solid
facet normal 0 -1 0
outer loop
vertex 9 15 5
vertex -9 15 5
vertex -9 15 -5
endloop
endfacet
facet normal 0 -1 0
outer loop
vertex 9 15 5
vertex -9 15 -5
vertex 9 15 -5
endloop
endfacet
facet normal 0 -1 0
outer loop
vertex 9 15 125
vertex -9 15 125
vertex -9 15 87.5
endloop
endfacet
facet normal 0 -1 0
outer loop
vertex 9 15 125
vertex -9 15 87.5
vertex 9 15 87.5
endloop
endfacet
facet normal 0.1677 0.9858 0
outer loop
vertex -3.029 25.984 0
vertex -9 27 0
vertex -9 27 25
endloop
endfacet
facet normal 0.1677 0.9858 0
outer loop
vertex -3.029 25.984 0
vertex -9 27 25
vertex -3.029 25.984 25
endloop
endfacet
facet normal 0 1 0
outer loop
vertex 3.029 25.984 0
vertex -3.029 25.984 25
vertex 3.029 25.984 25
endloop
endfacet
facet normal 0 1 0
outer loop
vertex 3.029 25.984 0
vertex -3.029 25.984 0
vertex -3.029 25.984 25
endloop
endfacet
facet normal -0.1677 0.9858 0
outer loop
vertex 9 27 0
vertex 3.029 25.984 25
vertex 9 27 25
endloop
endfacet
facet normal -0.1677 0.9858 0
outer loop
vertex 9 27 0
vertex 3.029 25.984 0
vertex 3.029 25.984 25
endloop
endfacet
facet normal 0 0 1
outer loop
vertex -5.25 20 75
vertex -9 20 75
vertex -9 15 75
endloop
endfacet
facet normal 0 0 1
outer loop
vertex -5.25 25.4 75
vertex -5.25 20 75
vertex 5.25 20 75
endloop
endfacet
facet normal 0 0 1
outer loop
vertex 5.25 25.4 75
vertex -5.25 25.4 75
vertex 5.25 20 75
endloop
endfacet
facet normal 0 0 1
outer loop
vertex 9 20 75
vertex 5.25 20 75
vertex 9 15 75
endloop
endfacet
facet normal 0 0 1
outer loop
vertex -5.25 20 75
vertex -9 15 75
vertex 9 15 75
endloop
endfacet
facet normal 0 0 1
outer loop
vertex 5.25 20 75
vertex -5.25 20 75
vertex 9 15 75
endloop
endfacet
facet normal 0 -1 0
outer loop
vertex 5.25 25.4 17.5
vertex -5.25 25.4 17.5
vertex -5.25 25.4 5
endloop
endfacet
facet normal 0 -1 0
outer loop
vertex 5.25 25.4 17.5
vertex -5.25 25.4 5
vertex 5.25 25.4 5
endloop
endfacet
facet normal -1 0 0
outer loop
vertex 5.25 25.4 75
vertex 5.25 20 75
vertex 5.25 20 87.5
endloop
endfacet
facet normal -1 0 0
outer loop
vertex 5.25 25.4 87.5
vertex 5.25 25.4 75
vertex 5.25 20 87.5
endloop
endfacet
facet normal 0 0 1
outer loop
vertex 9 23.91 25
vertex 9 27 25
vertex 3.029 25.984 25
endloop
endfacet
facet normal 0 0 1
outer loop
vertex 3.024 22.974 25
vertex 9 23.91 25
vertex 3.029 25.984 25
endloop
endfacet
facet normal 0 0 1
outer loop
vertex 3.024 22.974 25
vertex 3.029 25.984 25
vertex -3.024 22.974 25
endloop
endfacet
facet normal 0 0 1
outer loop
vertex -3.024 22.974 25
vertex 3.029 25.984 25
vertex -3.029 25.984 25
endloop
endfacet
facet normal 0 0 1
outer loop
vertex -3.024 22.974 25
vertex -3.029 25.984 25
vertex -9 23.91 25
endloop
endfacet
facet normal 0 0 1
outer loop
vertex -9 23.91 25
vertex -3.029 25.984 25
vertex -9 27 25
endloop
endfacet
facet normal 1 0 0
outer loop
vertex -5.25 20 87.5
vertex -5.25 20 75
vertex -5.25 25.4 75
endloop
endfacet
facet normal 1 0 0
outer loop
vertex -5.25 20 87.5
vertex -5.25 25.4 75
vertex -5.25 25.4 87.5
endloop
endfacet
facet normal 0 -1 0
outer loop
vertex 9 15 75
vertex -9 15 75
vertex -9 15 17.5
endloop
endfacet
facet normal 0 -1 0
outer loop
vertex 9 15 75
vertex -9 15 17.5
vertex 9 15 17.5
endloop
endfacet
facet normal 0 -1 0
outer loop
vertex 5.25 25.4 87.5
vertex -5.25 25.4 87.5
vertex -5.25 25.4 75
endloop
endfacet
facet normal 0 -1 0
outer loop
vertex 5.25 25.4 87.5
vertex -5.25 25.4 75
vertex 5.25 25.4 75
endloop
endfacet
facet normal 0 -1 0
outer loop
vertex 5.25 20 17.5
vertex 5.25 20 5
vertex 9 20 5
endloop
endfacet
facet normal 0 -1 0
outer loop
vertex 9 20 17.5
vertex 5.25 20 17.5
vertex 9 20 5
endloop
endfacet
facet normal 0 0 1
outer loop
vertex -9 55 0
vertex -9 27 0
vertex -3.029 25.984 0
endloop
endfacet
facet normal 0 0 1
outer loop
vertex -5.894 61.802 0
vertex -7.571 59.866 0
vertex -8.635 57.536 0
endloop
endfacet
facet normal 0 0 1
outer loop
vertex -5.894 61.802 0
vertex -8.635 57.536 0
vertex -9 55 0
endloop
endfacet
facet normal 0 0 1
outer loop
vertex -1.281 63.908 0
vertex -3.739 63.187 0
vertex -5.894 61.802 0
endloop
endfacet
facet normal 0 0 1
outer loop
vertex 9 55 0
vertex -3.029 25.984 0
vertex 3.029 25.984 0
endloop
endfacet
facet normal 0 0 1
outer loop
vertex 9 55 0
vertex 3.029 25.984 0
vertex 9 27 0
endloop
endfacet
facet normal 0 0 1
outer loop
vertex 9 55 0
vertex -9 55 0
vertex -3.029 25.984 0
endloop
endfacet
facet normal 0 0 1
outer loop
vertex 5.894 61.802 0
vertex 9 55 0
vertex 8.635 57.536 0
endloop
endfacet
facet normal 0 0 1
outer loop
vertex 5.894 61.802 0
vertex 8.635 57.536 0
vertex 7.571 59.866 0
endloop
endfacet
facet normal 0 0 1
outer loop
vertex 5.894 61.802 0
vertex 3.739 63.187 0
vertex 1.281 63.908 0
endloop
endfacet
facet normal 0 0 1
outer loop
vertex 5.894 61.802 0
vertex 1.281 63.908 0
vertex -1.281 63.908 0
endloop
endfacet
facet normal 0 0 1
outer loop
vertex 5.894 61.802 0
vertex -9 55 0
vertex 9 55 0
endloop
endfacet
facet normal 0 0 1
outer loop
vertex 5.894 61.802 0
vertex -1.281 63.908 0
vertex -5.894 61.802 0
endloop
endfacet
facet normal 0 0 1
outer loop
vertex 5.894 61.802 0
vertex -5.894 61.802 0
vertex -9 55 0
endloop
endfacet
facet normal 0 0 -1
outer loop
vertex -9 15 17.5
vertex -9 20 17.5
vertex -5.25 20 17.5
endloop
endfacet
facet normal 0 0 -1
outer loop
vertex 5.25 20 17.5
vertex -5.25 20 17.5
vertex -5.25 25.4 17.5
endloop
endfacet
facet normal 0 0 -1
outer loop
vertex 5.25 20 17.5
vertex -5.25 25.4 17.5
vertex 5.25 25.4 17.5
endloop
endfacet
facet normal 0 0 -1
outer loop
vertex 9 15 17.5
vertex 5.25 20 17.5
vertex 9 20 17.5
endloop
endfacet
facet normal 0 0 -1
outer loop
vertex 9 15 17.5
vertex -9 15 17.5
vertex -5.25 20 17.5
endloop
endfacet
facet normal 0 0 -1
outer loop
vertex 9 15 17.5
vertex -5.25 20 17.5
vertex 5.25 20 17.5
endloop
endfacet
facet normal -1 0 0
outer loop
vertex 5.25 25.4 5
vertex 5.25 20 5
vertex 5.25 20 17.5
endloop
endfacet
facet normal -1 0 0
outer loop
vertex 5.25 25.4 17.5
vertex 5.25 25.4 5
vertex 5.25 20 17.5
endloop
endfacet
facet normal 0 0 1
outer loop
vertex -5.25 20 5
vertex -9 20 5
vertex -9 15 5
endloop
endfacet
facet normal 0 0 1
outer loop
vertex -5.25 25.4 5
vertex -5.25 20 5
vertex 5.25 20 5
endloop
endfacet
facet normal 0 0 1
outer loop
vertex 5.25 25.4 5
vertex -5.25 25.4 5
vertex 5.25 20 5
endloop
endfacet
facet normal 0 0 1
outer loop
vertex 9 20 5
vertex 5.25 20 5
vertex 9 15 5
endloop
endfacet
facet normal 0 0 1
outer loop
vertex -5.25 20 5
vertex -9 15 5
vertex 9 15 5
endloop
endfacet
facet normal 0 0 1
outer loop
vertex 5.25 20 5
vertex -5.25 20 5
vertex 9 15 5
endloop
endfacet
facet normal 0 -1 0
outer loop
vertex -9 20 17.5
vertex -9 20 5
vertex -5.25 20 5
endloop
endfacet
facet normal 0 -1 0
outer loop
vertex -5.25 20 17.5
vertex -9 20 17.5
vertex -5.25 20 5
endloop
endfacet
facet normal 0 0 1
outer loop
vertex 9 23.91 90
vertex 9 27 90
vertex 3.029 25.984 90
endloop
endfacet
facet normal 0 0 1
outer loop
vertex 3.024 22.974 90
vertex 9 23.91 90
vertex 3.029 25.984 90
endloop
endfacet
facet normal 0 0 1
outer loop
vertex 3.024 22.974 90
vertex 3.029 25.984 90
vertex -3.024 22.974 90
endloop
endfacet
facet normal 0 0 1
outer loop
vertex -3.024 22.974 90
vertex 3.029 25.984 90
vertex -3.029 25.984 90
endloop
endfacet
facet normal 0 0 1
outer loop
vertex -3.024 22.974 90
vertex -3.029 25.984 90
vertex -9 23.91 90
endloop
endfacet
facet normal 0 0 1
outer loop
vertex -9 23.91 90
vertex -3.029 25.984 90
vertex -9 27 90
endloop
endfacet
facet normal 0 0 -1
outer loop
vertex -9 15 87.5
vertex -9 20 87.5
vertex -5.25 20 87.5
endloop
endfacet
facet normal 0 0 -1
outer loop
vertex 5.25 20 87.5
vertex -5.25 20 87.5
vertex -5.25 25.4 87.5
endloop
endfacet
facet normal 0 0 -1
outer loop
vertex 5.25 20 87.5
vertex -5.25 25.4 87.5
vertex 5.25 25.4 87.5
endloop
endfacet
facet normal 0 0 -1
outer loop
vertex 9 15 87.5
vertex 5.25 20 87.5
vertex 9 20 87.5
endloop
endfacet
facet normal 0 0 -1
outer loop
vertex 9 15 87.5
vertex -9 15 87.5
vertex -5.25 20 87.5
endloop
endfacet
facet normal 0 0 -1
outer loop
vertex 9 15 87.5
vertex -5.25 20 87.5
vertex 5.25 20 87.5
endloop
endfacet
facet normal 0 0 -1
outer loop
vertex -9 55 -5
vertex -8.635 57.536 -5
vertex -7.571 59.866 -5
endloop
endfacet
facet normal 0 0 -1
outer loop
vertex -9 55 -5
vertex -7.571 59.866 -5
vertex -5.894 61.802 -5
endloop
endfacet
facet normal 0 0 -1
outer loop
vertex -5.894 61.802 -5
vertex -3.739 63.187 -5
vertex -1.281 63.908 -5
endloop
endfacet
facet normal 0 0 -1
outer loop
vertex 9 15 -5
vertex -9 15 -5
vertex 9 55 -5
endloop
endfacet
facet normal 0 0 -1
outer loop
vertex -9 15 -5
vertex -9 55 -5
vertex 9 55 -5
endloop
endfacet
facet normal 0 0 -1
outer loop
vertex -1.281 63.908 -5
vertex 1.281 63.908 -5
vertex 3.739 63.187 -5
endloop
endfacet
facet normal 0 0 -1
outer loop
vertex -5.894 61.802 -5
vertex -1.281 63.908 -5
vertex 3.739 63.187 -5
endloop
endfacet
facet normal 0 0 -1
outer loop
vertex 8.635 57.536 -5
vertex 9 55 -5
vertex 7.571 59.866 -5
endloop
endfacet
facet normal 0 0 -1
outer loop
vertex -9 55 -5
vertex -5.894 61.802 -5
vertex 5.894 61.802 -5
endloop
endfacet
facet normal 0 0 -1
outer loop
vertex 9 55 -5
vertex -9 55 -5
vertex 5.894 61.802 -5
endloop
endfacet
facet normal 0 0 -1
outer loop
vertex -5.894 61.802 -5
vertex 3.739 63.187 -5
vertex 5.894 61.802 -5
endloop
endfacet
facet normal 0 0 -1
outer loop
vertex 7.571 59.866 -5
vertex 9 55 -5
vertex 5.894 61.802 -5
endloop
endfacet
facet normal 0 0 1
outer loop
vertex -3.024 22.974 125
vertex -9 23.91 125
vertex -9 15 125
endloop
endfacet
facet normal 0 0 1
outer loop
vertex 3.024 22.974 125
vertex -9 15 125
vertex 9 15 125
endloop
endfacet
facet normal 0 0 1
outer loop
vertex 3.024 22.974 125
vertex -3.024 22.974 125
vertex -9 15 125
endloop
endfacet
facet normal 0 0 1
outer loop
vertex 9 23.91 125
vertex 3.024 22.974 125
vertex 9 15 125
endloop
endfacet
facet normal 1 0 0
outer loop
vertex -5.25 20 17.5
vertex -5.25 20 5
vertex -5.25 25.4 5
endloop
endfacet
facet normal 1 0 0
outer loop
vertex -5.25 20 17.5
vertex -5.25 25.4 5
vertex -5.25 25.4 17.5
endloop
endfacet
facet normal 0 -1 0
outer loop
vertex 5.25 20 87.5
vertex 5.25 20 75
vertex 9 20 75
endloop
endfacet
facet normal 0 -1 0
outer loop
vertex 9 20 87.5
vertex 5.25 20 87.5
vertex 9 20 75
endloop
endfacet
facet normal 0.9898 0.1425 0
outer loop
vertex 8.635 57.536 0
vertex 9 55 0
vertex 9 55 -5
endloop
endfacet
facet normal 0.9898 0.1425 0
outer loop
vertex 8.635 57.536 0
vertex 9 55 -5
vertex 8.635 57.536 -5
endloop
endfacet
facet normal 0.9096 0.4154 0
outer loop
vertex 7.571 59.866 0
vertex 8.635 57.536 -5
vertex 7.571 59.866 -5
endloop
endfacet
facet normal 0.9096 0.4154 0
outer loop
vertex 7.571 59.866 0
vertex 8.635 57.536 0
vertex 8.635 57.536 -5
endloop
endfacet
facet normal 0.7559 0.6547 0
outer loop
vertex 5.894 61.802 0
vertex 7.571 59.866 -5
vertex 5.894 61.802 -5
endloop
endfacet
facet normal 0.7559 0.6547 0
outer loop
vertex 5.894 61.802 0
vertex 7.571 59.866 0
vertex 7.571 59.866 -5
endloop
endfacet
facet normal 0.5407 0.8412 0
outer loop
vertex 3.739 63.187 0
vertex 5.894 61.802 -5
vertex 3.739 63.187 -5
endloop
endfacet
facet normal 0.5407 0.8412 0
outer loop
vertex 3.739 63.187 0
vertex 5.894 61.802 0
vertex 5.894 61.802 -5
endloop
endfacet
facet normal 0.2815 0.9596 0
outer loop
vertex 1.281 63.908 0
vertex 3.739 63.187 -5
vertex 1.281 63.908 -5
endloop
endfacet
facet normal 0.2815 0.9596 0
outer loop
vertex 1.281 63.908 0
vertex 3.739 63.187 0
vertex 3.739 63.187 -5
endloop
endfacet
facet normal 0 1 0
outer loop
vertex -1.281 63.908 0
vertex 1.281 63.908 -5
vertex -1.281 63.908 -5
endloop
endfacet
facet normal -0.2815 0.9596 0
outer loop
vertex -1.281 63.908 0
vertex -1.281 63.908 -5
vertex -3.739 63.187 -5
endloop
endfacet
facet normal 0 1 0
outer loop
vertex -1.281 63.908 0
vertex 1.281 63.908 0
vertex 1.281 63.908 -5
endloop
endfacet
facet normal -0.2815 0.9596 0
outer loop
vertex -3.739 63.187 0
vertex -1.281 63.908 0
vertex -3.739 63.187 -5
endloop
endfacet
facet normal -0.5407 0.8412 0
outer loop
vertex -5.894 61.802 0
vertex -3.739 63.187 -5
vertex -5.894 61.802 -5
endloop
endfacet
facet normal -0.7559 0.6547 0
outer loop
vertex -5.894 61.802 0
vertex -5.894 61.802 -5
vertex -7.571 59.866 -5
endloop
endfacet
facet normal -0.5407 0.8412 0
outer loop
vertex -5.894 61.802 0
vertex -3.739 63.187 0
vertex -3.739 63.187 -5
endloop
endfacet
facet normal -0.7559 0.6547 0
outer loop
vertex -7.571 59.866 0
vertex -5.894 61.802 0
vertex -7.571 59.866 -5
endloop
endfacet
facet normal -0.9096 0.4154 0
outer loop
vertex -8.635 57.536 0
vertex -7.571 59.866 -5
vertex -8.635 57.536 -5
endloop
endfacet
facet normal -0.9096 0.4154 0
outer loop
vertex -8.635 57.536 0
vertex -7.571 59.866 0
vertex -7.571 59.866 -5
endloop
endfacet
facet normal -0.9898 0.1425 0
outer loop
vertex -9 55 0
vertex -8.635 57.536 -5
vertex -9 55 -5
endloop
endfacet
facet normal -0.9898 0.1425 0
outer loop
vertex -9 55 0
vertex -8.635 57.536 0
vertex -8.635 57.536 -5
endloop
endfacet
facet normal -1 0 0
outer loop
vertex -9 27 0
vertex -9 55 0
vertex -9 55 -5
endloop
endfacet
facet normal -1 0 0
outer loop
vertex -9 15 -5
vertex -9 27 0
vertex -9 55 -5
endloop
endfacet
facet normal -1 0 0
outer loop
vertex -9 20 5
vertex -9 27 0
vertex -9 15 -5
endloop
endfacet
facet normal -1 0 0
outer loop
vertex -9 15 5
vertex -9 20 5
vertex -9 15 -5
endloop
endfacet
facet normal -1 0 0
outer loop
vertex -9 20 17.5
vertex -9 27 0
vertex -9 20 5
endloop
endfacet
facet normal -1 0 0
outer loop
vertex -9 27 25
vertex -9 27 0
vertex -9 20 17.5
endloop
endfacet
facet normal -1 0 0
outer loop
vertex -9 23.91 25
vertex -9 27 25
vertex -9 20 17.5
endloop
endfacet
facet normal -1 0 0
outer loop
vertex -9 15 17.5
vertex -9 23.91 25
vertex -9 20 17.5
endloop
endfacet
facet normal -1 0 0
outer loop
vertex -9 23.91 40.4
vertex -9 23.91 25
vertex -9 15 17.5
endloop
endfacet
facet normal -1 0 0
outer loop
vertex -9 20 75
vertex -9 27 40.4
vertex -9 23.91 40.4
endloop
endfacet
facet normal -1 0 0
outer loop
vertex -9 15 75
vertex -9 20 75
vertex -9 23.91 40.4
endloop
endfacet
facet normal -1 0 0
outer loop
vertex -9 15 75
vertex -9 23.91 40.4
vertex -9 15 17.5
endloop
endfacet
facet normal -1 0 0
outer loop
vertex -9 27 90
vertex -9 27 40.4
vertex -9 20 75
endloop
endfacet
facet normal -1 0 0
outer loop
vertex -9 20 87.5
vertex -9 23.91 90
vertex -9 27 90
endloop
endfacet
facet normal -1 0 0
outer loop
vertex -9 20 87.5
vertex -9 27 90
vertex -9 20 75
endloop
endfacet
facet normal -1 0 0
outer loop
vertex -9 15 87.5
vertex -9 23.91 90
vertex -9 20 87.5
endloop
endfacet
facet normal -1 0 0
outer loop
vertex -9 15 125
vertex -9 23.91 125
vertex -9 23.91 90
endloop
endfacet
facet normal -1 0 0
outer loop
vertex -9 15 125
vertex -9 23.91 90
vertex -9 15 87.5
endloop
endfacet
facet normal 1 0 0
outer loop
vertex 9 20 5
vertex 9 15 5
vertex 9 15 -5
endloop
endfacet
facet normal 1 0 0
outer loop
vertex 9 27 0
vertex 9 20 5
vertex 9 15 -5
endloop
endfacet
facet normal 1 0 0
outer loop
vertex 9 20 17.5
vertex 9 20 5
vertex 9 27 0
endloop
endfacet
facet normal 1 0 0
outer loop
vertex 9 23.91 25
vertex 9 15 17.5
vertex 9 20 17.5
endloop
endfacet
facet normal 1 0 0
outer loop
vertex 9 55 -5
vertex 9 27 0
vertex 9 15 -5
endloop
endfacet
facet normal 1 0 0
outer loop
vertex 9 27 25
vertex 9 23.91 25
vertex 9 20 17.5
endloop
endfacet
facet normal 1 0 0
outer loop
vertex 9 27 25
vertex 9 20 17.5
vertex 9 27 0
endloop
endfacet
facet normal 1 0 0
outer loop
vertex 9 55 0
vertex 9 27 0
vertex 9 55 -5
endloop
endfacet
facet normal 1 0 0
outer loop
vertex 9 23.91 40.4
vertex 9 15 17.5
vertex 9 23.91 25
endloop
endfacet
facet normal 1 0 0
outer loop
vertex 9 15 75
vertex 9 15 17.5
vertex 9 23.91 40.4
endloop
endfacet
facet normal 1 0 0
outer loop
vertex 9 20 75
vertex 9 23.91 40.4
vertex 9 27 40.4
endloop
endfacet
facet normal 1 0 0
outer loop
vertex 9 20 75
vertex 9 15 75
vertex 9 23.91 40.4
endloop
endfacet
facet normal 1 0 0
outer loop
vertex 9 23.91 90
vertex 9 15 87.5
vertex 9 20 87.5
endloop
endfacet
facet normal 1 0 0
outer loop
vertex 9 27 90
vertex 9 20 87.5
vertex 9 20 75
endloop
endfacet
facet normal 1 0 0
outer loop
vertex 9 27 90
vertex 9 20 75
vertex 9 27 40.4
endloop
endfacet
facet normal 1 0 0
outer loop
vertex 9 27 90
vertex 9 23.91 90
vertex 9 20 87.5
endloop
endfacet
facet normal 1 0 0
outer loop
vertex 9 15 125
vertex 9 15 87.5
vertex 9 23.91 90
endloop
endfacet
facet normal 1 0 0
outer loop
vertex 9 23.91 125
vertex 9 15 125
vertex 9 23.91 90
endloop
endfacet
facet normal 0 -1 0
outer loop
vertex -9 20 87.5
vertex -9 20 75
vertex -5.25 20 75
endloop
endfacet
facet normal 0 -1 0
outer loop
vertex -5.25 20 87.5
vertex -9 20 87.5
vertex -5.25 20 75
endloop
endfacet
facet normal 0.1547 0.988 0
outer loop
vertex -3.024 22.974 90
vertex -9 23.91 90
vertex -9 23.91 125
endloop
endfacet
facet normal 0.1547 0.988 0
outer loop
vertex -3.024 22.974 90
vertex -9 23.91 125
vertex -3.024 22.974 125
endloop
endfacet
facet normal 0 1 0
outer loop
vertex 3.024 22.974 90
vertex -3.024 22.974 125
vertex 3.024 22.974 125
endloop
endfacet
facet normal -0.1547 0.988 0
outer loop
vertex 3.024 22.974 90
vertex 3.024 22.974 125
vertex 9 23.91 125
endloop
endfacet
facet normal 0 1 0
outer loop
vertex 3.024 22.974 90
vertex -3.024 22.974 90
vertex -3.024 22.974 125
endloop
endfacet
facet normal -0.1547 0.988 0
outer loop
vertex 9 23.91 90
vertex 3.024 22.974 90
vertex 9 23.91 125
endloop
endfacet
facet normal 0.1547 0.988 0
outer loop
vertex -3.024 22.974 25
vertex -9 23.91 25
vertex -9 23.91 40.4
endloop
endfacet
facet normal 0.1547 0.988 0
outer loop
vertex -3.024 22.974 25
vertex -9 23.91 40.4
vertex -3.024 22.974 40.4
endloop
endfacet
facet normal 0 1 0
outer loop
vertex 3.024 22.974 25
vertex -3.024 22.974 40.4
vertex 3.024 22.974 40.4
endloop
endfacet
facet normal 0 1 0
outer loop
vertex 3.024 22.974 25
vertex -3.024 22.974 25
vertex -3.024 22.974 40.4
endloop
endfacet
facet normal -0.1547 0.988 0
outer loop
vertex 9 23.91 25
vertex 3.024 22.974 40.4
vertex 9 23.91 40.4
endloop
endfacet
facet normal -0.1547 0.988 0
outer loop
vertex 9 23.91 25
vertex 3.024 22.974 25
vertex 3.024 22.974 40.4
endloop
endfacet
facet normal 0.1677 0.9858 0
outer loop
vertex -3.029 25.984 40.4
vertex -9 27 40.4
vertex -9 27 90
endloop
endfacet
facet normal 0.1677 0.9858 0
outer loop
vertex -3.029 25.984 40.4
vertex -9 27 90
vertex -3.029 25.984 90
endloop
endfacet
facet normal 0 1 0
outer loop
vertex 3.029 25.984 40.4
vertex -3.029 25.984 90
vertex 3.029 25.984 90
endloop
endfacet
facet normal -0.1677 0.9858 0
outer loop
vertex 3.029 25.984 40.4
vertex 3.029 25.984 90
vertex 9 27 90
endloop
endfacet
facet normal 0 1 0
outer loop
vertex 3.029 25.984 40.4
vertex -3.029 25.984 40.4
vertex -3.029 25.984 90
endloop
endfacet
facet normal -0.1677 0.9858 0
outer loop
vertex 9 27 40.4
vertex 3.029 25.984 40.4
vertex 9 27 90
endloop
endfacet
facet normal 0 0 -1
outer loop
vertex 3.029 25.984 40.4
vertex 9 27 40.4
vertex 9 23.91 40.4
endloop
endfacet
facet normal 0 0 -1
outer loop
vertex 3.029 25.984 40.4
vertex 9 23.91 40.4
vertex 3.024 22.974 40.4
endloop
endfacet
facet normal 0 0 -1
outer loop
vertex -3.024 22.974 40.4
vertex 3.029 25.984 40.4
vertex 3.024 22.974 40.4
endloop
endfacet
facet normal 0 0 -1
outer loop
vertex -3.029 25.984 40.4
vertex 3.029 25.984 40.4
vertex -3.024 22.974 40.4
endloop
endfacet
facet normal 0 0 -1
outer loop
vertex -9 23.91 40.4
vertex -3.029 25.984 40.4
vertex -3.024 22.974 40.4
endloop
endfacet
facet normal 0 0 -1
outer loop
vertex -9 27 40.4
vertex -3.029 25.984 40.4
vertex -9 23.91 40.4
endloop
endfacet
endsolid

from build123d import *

# Parameters (mm, degrees)
PAD002_DEPTH    = 125
PAD003_DEPTH    = 5
SKETCH004_W     = 10.5
SKETCH004_H     = 12.5
POCKET_DEPTH    = 10.4
POCKET001_DEPTH = 15.4
POCKET002_DEPTH = 35
SKETCH016_W     = 18
SKETCH016_H     = 12.5
POCKET008_DEPTH = 5


with BuildPart() as part:
    # Sketch002 → Pad002 (new body)
    with BuildSketch(Plane.XY):
        with BuildLine():
            Line((-9, 15), (9, 15))
            Line((9, 15), (9, 27))
            ThreePointArc((-9, 27), (0, 25.85685), (9, 27))
            Line((-9, 27), (-9, 15))
        make_face()
    extrude(amount=PAD002_DEPTH)

    # Sketch003 → Pad003 (join)
    with BuildSketch(Plane.XY):
        with BuildLine():
            Line((-9, 15), (9, 15))
            Line((9, 15), (9, 55))
            ThreePointArc((9, 55), (0, 64), (-9, 55))
            Line((-9, 55), (-9, 15))
        make_face()
    extrude(amount=-PAD003_DEPTH)

    # Sketch004 → Pocket (cut)
    with BuildSketch(Plane.XZ.offset(-15)):
        with Locations((0, 11.25)):
            Rectangle(SKETCH004_W, SKETCH004_H)
        with Locations((0, 81.25)):
            Rectangle(SKETCH004_W, SKETCH004_H)
    extrude(amount=-POCKET_DEPTH, mode=Mode.SUBTRACT)

    # Sketch008 → Pocket001 (cut)
    with BuildSketch(Plane.XY.offset(25)):
        with BuildLine():
            ThreePointArc((-9, 27), (0, 25.85685), (9, 27))
            Line((9, 27), (9, 23.909518))
            ThreePointArc((-9, 23.909518), (0, 22.85685), (9, 23.909518))
            Line((-9, 27), (-9, 23.909518))
        make_face()
    extrude(amount=POCKET001_DEPTH, mode=Mode.SUBTRACT)

    # Sketch009 → Pocket002 (cut)
    with BuildSketch(Plane.XY.offset(90)):
        with BuildLine():
            ThreePointArc((-9, 27), (0, 25.85685), (9, 27))
            Line((9, 27), (9, 23.909518))
            ThreePointArc((-9, 23.909518), (0, 22.85685), (9, 23.909518))
            Line((-9, 27), (-9, 23.909518))
        make_face()
    extrude(amount=POCKET002_DEPTH, mode=Mode.SUBTRACT)

    # Sketch016 → Pocket008 (cut)
    with BuildSketch(Plane.XZ.offset(-15)):
        with Locations((0, 11.25)):
            Rectangle(SKETCH016_W, SKETCH016_H)
        with Locations((0, 81.25)):
            Rectangle(SKETCH016_W, SKETCH016_H)
    extrude(amount=-POCKET008_DEPTH, mode=Mode.SUBTRACT)


solid = part.part
